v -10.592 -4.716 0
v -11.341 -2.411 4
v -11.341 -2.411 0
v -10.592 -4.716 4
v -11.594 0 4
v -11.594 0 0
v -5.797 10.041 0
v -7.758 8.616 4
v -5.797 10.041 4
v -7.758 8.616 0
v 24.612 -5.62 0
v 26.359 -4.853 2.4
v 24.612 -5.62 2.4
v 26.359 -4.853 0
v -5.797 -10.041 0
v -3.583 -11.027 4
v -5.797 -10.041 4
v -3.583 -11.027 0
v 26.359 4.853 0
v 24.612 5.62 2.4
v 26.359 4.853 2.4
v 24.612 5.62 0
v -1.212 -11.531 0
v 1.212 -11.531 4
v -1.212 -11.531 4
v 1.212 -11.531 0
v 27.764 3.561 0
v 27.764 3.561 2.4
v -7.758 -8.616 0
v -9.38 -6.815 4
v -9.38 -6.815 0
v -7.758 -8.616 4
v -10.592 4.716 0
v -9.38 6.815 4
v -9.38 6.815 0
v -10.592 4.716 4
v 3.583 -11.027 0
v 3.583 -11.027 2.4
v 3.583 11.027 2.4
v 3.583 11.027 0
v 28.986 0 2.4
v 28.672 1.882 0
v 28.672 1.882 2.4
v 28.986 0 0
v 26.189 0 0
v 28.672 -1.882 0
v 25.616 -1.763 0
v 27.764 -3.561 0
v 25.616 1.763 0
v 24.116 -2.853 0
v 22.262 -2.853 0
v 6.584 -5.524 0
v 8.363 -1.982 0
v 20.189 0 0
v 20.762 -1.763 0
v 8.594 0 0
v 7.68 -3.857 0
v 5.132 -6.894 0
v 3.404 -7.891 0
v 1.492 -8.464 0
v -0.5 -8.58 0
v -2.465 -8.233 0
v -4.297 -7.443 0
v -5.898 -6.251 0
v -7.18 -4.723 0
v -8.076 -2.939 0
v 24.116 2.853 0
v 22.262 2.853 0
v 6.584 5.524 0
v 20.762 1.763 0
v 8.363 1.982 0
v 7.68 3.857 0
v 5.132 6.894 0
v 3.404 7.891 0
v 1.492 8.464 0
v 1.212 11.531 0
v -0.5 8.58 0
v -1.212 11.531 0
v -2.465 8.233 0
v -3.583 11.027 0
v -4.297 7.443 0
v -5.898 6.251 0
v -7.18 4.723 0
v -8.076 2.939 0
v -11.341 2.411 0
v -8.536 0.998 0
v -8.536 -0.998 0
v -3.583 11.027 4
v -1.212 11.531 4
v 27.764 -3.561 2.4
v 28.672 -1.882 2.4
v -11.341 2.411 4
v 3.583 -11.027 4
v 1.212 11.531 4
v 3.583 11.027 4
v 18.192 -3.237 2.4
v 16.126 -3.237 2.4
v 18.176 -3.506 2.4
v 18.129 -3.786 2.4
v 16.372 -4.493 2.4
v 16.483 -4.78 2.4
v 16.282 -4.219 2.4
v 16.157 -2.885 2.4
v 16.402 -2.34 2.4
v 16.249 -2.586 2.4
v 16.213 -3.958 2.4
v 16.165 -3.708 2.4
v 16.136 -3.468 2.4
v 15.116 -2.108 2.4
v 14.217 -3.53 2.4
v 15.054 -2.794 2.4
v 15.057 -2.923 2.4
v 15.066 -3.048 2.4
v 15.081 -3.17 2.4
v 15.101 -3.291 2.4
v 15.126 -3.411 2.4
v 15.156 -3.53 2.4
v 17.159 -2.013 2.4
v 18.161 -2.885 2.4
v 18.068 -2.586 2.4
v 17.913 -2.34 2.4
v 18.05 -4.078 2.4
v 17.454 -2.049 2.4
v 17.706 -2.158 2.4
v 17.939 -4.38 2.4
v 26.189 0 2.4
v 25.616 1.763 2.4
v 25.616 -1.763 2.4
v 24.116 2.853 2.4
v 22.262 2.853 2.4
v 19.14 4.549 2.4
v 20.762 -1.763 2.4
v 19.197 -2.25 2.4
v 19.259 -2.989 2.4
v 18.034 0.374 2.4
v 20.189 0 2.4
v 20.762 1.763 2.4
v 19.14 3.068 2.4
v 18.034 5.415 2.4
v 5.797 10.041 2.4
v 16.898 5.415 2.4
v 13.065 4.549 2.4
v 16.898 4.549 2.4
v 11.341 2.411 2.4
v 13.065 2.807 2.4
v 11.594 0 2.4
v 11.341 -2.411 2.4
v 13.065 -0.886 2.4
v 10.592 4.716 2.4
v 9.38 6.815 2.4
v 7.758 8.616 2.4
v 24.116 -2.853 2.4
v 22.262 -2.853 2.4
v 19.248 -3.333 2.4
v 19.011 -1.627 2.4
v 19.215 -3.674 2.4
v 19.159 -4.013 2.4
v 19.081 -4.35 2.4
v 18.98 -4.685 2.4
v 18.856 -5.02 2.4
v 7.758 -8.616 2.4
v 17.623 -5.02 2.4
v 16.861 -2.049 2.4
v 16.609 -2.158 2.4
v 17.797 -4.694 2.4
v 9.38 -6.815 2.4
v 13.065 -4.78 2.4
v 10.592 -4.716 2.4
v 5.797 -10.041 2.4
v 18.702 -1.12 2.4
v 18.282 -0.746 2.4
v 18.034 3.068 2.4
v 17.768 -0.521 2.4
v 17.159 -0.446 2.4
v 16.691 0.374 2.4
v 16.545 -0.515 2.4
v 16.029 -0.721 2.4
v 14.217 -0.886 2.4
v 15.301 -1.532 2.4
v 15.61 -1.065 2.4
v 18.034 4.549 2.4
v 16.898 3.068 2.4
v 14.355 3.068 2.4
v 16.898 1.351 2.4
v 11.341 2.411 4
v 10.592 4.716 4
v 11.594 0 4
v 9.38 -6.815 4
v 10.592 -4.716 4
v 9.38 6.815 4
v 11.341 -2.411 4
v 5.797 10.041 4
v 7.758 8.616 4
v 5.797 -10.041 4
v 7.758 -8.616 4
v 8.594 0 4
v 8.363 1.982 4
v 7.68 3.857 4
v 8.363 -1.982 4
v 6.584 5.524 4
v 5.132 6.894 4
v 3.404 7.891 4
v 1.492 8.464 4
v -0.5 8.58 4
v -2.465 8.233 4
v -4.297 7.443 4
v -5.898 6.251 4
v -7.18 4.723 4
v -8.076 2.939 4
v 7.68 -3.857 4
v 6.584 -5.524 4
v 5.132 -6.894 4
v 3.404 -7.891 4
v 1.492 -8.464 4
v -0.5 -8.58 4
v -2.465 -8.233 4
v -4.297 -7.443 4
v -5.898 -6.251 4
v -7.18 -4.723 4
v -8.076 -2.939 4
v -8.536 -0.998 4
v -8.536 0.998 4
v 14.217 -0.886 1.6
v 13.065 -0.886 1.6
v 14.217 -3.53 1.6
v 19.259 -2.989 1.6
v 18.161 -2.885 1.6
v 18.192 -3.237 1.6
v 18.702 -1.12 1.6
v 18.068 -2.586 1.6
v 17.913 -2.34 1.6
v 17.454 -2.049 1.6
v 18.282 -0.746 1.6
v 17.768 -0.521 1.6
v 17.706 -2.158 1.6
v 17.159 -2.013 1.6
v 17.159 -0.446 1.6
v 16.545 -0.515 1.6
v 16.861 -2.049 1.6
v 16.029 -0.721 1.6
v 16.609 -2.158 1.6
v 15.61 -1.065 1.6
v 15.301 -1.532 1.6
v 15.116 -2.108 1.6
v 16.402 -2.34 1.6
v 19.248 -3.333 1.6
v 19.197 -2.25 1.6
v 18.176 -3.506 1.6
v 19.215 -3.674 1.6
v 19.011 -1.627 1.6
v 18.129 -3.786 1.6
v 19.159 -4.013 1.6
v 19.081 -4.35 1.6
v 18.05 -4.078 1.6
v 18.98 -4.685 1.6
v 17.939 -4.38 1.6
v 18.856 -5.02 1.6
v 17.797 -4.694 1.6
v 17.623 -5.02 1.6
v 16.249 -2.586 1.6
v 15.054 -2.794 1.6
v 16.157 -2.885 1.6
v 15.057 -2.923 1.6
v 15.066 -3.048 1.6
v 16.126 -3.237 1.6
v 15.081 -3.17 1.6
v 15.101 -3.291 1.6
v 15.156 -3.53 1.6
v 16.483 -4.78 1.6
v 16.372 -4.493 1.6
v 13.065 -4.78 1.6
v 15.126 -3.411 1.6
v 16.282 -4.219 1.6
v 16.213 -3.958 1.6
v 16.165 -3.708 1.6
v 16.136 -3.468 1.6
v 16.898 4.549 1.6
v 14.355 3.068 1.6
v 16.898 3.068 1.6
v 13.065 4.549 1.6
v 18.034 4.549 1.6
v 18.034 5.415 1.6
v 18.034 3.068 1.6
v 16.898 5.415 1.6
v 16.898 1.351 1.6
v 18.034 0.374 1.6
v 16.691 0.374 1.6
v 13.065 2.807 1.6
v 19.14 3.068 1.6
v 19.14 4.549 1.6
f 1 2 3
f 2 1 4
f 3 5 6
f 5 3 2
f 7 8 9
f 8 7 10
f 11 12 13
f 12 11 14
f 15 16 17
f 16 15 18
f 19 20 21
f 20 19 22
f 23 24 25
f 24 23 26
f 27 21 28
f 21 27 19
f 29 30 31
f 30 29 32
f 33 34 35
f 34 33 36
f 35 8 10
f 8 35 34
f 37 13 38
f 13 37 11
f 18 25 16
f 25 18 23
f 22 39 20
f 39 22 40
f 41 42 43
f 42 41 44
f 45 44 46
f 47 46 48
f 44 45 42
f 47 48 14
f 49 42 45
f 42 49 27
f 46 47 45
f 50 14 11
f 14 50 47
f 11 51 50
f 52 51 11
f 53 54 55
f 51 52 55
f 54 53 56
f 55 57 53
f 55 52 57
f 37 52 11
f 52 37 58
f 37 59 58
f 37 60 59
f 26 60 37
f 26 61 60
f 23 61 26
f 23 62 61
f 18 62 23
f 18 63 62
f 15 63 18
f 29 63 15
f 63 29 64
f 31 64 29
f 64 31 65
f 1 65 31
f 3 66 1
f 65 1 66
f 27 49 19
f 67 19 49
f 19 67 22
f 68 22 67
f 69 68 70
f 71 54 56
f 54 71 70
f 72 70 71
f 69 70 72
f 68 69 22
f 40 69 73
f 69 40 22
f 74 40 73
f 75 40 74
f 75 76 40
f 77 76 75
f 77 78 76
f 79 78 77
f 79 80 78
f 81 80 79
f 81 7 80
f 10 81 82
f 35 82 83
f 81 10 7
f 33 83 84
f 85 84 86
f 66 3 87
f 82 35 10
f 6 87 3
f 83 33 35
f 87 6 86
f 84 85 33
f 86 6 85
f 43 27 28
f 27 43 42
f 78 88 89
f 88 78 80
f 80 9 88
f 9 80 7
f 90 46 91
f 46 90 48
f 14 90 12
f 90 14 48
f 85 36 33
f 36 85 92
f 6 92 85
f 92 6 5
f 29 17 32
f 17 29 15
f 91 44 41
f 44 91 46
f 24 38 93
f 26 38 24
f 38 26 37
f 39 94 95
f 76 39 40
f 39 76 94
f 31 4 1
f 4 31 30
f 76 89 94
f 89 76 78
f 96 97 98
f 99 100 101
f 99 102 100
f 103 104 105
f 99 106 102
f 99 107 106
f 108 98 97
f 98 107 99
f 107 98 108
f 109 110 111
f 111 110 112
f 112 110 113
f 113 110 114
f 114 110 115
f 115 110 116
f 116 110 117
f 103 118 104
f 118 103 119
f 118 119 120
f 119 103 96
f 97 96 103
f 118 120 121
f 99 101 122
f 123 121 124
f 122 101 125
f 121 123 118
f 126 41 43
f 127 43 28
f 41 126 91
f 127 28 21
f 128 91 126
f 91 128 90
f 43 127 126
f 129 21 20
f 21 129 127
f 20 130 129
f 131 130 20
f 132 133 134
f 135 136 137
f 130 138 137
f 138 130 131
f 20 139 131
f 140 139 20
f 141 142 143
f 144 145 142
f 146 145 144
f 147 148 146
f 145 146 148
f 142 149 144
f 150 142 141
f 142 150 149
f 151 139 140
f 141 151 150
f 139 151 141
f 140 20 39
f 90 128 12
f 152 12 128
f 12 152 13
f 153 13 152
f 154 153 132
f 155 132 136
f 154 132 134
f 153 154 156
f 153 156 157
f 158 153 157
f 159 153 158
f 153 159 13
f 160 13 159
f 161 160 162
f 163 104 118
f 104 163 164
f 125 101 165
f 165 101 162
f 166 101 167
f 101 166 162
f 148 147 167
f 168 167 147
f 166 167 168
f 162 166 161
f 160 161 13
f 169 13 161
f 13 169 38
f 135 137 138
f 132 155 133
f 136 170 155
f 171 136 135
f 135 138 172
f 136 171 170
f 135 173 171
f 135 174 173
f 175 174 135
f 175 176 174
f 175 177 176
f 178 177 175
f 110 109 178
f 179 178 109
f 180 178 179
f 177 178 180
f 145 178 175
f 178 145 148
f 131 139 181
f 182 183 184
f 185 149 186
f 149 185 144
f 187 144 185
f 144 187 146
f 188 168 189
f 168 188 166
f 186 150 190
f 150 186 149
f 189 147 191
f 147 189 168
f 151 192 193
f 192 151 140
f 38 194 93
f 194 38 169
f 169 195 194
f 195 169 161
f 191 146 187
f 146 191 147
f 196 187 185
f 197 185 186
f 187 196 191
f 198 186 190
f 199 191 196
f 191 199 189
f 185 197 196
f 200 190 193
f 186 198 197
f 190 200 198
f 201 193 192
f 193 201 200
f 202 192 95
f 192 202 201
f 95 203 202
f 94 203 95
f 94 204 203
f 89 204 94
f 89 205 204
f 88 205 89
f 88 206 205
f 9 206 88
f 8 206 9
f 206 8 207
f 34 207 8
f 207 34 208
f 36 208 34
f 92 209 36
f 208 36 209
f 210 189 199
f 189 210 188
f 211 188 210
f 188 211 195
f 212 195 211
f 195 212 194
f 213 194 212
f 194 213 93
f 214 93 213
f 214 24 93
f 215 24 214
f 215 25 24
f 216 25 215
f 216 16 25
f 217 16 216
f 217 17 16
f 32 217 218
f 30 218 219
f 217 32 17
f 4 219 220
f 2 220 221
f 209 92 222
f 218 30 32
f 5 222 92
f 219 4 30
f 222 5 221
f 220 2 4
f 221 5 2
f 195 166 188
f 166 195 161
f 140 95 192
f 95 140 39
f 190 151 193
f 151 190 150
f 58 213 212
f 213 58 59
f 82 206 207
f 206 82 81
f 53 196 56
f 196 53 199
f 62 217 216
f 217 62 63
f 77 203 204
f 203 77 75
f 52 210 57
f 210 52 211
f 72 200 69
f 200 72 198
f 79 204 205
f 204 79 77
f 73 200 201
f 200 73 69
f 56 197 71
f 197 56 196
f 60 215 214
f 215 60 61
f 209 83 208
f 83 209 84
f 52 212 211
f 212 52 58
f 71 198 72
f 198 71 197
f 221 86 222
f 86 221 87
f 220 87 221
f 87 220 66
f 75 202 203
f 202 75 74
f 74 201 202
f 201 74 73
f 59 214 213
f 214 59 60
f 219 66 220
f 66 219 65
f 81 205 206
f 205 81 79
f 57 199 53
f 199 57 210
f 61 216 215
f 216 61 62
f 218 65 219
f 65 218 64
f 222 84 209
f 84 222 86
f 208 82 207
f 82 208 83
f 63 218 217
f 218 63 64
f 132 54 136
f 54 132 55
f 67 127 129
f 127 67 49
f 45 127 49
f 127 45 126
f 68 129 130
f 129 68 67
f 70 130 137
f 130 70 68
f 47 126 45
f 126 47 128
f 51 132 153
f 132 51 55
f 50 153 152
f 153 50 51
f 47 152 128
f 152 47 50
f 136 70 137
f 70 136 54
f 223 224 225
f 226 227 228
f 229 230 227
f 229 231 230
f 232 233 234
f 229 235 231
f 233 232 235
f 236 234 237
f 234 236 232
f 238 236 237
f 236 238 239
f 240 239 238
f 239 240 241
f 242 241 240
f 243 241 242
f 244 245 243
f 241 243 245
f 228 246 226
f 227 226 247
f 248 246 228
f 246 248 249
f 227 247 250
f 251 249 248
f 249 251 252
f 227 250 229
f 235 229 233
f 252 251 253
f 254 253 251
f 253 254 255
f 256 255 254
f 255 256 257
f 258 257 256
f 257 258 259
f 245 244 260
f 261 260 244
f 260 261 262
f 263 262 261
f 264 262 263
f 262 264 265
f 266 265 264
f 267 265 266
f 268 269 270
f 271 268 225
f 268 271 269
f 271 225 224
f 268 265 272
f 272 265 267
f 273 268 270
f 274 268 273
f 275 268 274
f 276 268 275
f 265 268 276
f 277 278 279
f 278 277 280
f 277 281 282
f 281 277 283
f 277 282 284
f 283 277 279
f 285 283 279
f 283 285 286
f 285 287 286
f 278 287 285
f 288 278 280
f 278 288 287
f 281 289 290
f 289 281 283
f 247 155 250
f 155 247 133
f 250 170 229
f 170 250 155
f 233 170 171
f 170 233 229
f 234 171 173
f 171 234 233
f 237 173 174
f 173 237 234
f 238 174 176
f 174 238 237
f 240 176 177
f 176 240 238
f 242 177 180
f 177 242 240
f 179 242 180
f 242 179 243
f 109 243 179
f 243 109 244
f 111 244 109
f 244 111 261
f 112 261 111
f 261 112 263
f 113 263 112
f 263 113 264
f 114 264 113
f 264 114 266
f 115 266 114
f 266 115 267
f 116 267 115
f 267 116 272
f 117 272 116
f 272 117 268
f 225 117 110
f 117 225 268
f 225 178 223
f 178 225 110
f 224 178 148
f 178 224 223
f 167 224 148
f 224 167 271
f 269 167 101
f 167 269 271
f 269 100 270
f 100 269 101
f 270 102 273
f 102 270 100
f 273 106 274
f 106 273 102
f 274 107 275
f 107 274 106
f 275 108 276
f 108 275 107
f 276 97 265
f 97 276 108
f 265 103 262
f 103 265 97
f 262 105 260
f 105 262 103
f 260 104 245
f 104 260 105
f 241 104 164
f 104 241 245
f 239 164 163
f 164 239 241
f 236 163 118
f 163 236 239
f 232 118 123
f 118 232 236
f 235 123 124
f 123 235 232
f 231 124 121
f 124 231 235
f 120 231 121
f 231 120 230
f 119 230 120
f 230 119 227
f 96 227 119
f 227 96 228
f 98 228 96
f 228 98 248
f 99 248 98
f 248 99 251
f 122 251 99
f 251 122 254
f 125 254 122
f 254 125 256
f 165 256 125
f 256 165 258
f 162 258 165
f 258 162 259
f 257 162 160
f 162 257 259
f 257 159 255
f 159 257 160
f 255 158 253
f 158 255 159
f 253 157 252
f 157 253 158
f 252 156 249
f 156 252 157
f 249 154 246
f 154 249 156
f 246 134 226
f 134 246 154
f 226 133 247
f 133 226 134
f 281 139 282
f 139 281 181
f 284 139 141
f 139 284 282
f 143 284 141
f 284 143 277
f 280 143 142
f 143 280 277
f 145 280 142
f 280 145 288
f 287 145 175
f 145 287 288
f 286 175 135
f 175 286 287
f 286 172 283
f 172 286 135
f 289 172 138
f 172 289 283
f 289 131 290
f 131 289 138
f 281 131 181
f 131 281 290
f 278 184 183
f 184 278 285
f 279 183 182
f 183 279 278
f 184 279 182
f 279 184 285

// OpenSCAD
// Parametric finger size gauge (measuring ring).
// Copyright (C) 2017 Miroslav Hradílek

// This program is  free software:  you can redistribute it and/or modify it
// under  the terms  of the  GNU General Public License  as published by the
// Free Software Foundation, version 3 of the License.
//
// This program  is  distributed  in the hope  that it will  be useful,  but
// WITHOUT  ANY WARRANTY;  without  even the implied  warranty of MERCHANTA-
// BILITY  or  FITNESS FOR A PARTICULAR PURPOSE.  See the GNU General Public
// License for more details.
//
// You should have received a copy of the  GNU General Public License  along
// with this program. If not, see <http://www.gnu.org/licenses/>.

inner_ring_circumference = 54; // 
wall_width = 3; // 
thickness  = 4; // 

inner_ring_diameter = inner_ring_circumference / PI;
echo(inner_ring_diameter);
outer_diameter = inner_ring_diameter + 2 * wall_width;

module base() {   
    hull(){
        circle(d=outer_diameter);
        translate([outer_diameter,0,0]) circle(d=outer_diameter/2);
    }
    
}

module body() {
    union() {
        linear_extrude(height = thickness*0.6) base();
        linear_extrude(height = thickness) circle(d=outer_diameter);
    }
}

module part() {
    difference(){
        body();
        cylinder(h = thickness, d = inner_ring_diameter, center = false);
        translate([outer_diameter,0,0]) cylinder(h = thickness, d = 6, center = false);
        translate([outer_diameter*0.7,0,thickness*0.4]) rotate([0,0,90]) linear_extrude(height = thickness*0.2) text(font=":style=Bold",size=6,halign="center",valign="center",str(inner_ring_circumference));
    }
}

part();
